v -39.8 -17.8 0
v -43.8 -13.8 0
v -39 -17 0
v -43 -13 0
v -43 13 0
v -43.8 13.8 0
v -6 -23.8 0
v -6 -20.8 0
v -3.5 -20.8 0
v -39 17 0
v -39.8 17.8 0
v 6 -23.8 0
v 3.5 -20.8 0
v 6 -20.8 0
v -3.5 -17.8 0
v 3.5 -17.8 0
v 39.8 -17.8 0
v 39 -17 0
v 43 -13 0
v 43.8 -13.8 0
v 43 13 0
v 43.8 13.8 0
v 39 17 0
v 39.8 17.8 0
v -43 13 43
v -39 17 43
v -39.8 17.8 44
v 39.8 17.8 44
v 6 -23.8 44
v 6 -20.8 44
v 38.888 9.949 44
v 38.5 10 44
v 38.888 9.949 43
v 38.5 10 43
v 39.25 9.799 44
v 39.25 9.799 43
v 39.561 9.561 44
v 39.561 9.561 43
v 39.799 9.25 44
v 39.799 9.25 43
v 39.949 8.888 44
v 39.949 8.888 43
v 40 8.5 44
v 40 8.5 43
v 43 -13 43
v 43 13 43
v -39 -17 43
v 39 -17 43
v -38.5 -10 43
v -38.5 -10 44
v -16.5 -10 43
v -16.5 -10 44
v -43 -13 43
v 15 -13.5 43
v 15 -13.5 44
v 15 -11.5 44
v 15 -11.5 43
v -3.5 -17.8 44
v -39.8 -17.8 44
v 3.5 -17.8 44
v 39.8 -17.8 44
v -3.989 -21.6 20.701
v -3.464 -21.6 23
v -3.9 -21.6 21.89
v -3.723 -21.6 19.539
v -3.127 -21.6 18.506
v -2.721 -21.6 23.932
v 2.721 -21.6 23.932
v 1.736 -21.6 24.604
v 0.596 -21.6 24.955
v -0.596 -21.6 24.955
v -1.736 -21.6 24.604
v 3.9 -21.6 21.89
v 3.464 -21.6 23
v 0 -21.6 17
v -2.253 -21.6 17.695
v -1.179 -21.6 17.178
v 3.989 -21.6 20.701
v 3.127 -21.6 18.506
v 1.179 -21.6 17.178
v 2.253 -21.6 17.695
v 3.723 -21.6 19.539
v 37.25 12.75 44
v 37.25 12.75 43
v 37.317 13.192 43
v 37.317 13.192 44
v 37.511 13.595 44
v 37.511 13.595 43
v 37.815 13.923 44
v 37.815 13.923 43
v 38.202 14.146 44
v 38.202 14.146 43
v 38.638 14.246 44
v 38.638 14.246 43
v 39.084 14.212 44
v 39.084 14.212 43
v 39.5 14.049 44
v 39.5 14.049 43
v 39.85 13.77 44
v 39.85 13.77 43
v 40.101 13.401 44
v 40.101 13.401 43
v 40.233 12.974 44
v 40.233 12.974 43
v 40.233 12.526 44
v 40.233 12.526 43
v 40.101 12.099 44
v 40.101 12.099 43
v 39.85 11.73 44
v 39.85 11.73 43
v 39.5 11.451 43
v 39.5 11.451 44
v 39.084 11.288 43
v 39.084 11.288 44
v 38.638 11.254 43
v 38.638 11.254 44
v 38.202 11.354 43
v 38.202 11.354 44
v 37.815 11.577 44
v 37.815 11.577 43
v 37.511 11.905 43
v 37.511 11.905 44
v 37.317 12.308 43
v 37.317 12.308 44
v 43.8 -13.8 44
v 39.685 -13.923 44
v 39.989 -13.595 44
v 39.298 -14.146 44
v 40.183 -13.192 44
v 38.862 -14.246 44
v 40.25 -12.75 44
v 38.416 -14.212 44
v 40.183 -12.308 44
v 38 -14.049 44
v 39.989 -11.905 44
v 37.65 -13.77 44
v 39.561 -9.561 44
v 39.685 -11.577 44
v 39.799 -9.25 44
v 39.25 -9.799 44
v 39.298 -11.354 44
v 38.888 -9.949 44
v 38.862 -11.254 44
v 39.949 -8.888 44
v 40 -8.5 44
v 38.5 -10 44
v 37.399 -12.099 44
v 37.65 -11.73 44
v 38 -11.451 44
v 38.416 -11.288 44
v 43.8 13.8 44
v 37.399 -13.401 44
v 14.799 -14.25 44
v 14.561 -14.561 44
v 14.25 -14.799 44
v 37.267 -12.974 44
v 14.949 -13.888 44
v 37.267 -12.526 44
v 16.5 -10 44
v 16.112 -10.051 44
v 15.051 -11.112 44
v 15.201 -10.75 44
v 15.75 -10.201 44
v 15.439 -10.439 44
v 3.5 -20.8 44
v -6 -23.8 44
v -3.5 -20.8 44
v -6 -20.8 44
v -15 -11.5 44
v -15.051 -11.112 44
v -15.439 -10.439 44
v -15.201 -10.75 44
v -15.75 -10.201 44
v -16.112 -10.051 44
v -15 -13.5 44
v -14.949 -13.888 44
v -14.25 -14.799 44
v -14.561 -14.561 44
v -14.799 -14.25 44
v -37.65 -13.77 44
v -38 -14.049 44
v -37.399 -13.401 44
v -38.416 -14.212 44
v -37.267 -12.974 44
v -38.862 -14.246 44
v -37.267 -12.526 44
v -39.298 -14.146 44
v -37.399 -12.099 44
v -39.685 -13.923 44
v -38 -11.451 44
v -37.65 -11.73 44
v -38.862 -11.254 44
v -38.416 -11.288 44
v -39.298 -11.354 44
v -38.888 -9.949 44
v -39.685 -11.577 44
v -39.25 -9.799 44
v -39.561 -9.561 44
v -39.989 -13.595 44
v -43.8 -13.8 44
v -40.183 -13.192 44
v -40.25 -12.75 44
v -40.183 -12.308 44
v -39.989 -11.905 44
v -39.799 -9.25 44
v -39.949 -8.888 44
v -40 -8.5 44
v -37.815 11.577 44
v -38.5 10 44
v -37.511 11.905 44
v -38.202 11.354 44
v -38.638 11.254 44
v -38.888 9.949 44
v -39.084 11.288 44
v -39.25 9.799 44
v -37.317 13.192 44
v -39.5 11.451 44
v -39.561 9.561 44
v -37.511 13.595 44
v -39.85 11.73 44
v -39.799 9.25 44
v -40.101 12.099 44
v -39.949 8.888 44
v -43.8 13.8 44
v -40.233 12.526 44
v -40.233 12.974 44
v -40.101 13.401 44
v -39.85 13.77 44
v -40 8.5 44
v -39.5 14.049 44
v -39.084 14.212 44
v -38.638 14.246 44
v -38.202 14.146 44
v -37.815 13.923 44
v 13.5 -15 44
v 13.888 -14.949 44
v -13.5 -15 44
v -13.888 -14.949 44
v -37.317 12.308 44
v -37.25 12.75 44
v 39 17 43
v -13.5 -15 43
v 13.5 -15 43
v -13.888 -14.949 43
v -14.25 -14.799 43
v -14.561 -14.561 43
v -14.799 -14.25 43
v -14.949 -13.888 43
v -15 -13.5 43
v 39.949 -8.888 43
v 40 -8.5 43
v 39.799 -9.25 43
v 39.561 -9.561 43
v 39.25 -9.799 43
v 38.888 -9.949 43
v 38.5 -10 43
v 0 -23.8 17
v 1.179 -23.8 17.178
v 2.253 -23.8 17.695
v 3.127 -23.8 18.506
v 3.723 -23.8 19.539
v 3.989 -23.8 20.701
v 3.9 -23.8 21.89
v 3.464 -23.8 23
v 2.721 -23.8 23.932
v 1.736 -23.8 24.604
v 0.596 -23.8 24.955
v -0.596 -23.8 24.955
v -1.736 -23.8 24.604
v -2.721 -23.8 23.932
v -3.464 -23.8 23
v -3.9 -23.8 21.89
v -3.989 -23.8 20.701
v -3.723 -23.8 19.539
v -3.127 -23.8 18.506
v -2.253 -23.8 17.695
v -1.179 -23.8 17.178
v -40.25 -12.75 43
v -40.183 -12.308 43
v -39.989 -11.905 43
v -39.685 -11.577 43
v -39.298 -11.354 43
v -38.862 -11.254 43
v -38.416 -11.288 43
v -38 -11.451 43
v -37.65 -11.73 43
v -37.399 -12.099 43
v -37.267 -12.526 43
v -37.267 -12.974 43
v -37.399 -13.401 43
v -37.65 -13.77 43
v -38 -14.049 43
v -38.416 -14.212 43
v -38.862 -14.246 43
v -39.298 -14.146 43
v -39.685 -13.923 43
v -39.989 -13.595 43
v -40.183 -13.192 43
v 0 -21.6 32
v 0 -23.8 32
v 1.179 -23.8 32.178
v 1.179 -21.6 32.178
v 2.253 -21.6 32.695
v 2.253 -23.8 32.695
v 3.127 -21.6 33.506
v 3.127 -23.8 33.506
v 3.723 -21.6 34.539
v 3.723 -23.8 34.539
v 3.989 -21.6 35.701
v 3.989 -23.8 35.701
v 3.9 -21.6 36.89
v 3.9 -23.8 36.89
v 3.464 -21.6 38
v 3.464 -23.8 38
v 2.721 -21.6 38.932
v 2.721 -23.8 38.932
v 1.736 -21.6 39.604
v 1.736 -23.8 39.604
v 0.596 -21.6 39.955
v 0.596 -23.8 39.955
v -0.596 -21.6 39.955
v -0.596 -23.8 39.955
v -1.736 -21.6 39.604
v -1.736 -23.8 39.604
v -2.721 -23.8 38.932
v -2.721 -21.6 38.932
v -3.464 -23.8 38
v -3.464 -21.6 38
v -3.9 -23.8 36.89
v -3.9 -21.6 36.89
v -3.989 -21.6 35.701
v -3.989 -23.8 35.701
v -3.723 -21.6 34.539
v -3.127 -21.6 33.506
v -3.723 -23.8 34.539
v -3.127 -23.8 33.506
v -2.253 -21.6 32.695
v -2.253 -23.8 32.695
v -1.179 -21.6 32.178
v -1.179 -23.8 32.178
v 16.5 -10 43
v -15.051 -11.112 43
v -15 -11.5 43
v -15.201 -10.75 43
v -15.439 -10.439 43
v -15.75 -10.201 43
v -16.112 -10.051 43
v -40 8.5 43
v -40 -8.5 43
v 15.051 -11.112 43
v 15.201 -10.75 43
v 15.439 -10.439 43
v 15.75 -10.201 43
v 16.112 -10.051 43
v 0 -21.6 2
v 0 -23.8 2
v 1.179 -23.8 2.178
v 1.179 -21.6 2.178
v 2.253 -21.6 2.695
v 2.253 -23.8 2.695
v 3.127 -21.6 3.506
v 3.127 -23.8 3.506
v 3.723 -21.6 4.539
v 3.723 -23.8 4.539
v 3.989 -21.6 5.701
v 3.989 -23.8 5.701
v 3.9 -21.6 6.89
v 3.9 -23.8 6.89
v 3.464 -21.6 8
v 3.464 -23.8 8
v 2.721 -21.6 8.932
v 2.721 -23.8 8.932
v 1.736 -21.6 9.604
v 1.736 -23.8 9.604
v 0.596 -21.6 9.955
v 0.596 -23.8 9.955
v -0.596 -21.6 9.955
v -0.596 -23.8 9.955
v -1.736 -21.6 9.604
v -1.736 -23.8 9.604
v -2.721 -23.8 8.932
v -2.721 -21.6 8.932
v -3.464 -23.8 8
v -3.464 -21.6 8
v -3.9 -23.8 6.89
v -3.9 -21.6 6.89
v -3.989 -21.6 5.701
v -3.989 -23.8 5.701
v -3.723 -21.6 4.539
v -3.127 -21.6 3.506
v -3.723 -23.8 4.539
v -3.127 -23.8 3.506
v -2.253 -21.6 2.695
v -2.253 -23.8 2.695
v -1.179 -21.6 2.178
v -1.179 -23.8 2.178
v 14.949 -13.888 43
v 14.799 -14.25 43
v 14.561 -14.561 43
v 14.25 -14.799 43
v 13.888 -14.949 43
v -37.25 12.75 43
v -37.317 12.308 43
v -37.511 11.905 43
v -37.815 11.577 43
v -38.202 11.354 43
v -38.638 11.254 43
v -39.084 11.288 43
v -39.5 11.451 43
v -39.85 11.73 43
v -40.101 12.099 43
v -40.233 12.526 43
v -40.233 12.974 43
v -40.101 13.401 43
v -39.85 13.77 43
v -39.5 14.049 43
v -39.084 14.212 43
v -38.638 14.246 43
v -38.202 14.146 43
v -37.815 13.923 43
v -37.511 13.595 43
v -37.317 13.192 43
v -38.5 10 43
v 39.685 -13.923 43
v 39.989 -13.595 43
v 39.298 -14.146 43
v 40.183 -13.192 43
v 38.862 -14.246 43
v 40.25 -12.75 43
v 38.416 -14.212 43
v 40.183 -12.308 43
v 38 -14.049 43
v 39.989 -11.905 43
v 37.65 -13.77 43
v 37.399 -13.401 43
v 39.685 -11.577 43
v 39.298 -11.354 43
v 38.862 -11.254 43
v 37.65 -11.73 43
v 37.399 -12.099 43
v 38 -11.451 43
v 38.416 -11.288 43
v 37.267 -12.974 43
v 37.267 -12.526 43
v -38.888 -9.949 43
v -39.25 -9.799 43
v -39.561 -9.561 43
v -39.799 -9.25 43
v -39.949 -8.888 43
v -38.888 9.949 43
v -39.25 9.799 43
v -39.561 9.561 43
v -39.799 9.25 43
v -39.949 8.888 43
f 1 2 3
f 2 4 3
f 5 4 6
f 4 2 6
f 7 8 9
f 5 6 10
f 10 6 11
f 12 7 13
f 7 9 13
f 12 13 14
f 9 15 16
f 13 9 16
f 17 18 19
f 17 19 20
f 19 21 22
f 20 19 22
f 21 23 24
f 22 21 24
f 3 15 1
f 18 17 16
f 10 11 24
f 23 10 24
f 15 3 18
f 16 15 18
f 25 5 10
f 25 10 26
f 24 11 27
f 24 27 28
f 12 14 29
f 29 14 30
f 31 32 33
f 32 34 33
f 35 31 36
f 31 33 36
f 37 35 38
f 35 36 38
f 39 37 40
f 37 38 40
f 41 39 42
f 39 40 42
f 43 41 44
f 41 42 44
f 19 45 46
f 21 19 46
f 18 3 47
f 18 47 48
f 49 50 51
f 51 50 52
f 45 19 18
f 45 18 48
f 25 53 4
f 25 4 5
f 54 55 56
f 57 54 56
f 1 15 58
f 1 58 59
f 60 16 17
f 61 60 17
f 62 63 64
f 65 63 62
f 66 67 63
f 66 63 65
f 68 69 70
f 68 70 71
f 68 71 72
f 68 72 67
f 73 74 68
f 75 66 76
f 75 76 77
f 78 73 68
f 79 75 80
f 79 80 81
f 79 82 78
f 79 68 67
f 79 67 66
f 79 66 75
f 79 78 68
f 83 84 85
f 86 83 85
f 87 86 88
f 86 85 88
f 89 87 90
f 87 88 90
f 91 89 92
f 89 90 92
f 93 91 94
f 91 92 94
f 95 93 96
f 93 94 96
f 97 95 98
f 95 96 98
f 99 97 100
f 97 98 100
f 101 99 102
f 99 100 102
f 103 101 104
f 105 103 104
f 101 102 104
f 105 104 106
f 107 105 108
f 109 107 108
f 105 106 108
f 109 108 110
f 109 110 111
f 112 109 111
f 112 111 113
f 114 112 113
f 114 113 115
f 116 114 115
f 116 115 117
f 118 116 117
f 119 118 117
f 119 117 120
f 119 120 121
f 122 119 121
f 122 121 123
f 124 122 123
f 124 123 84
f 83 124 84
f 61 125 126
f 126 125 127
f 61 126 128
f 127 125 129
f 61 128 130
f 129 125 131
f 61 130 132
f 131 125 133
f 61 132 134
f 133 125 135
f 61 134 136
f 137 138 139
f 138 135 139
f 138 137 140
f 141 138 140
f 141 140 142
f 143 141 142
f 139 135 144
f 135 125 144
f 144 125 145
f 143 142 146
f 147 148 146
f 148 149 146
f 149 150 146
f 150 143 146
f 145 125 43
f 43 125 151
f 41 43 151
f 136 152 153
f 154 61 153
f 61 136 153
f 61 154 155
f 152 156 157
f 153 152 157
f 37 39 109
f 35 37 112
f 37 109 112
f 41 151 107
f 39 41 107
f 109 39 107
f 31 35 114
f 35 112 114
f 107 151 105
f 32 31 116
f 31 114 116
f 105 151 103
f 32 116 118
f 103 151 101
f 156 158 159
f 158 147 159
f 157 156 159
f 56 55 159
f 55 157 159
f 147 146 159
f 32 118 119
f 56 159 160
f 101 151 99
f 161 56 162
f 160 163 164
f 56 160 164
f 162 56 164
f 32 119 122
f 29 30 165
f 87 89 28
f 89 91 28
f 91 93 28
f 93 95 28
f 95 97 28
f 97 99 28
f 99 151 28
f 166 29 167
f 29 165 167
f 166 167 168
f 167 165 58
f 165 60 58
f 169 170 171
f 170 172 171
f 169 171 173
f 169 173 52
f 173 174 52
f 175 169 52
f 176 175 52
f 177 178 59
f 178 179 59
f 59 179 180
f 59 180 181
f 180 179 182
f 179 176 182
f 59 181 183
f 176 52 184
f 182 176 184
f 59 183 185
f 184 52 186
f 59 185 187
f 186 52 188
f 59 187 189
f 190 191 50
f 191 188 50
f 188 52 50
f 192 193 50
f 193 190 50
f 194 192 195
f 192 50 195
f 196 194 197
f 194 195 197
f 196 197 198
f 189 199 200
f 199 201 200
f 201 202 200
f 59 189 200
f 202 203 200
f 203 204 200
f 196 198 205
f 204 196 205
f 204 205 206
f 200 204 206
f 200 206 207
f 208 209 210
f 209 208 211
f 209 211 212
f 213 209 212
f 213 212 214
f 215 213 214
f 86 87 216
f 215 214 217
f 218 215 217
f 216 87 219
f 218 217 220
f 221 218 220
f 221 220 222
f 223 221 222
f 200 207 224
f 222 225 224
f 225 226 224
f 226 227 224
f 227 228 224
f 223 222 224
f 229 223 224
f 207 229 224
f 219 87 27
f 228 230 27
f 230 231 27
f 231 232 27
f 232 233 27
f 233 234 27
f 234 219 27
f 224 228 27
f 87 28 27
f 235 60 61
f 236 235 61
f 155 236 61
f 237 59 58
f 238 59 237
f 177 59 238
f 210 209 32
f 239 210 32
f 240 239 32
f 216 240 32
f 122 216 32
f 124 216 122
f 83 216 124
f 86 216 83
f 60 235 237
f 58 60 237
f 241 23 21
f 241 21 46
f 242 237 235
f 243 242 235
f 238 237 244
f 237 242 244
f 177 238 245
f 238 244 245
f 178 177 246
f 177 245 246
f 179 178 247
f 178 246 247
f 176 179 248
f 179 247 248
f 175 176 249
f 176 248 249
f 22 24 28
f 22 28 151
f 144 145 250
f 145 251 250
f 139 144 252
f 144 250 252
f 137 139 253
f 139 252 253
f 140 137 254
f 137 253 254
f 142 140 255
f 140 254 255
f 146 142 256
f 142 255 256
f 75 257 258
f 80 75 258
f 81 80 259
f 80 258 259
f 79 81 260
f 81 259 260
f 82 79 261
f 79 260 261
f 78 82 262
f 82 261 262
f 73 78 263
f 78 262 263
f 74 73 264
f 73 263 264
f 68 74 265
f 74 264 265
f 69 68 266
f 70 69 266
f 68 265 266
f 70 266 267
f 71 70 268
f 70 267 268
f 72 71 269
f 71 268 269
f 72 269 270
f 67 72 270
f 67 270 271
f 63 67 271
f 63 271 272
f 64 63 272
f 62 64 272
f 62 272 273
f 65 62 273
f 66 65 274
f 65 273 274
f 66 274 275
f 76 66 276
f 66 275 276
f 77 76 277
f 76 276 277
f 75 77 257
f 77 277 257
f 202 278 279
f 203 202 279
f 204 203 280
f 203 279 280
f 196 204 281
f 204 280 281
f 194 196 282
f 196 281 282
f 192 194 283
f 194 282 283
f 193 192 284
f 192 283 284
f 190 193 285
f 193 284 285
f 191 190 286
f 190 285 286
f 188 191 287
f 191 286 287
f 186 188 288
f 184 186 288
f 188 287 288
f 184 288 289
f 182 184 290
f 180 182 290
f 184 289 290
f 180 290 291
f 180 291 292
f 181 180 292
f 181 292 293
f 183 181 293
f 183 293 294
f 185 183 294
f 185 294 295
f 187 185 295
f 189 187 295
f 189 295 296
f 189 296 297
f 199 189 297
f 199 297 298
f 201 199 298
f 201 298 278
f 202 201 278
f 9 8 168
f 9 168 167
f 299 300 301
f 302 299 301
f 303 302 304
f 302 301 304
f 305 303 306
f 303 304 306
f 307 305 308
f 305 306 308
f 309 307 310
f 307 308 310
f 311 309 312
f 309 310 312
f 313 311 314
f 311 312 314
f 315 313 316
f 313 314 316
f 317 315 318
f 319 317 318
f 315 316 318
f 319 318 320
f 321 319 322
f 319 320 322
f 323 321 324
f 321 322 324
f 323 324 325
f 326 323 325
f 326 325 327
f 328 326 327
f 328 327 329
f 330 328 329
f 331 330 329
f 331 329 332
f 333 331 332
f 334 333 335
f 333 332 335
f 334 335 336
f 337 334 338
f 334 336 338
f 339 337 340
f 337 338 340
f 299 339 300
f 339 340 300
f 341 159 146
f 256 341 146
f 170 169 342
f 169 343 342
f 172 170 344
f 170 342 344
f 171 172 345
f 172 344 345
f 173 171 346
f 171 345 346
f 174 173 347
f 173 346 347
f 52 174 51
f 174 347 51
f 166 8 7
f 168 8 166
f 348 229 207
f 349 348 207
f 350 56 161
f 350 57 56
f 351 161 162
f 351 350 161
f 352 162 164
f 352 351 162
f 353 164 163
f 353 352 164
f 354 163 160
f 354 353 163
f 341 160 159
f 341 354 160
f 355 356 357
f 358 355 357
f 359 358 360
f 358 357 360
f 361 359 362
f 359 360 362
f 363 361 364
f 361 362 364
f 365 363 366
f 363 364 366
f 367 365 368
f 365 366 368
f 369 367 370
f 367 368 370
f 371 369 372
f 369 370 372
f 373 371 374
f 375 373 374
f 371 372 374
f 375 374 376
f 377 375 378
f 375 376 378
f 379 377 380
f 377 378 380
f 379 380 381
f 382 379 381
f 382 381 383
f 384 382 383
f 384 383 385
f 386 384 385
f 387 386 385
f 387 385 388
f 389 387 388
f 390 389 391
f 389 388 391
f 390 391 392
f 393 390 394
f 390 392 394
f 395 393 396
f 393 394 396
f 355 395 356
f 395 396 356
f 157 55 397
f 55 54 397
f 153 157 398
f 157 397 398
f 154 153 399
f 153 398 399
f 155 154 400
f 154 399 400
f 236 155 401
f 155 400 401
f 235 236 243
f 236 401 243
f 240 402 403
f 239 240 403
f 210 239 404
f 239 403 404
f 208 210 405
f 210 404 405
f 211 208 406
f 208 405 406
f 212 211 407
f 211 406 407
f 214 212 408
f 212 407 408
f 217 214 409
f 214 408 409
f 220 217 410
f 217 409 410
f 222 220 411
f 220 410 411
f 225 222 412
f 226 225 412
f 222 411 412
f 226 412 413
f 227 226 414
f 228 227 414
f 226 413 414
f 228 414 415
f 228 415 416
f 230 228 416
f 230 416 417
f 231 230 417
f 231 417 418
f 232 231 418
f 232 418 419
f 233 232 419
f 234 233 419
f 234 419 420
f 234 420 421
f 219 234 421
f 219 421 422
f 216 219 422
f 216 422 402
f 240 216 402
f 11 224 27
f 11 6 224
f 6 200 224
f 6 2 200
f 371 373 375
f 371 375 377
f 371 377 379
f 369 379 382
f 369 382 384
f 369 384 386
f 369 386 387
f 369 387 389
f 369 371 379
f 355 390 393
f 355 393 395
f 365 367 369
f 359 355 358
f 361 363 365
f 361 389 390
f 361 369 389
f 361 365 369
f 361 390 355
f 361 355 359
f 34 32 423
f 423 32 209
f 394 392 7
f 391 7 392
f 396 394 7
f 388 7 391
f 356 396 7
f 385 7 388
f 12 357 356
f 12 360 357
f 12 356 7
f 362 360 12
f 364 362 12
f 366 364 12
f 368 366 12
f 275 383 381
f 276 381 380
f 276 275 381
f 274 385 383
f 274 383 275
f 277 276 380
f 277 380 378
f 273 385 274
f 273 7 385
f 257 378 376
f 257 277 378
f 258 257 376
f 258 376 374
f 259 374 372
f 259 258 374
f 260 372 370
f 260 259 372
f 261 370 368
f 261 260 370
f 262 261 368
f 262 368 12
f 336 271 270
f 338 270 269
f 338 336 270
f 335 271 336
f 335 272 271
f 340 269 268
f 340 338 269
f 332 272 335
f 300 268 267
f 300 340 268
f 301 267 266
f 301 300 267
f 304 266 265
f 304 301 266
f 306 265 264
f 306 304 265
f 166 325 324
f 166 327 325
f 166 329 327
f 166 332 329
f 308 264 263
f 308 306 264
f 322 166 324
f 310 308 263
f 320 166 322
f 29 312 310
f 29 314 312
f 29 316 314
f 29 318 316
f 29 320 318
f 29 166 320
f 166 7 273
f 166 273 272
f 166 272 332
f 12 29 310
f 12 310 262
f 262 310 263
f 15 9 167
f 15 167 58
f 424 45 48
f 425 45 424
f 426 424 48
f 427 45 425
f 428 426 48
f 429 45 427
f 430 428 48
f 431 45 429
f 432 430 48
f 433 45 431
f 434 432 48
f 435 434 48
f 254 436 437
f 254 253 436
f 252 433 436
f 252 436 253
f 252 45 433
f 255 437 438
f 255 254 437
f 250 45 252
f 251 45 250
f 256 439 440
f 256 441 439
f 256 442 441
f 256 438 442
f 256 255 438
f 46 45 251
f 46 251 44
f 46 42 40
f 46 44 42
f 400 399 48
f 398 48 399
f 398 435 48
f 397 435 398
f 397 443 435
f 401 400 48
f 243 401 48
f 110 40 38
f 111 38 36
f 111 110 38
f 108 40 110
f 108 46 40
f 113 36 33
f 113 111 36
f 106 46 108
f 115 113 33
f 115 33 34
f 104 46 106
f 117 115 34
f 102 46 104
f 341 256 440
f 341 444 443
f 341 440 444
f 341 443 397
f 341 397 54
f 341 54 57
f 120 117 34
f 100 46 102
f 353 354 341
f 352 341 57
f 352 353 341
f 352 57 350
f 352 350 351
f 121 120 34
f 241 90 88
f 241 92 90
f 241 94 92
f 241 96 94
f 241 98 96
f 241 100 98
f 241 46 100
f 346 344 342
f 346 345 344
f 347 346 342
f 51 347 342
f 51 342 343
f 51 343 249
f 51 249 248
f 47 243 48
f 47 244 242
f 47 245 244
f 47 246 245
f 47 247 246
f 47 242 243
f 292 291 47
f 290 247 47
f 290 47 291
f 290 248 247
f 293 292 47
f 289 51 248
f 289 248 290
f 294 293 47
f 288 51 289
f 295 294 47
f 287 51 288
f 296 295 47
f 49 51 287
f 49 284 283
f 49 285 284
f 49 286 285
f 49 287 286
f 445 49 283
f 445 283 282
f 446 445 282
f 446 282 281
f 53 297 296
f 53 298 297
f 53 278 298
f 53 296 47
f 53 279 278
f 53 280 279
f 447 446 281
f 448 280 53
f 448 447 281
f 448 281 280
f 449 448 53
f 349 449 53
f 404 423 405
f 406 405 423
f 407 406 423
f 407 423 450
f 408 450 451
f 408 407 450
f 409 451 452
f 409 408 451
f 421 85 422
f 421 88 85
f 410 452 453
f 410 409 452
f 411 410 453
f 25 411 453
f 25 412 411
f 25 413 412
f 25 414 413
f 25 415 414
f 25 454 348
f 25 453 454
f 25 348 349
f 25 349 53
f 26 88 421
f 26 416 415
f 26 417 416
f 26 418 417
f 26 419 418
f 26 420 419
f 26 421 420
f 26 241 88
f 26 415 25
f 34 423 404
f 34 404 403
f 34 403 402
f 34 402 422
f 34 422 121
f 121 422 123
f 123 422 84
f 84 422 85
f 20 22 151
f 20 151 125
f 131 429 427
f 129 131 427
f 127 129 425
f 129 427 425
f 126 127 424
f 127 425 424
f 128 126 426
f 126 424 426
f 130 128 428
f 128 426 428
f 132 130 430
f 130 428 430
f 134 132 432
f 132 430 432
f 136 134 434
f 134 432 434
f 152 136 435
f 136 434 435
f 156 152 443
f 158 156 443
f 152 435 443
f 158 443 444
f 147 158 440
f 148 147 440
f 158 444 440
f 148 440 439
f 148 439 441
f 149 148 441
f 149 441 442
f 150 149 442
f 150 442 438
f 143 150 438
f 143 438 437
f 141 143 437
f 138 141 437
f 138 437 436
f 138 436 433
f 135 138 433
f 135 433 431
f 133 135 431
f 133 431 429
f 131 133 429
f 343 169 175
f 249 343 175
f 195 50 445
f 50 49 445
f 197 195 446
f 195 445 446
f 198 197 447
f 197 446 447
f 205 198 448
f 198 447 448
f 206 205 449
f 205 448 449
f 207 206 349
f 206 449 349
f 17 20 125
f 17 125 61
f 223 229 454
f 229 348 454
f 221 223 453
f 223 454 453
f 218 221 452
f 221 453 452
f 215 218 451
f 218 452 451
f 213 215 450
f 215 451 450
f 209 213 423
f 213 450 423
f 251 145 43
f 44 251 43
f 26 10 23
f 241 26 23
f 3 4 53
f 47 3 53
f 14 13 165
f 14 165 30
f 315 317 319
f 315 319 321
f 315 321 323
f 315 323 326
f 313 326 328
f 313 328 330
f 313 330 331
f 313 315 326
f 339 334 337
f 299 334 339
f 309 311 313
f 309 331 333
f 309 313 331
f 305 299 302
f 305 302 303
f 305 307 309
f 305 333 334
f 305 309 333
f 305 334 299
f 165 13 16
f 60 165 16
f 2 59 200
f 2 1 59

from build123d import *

# Parameters (mm, degrees)
SKETCH_1_W          = 87.6
SKETCH_1_H          = 35.6
SKETCH_1_W_2        = 86
SKETCH_1_H_2        = 34
EXTRUDE_1_DEPTH     = 43
CHAMFER_1_SIZE      = 4
EXTRUDE_2_DEPTH     = 1
CUT_EXTRUDE_1_DEPTH = 65.585447277
FILLET_1_R          = 1.5
SKETCH_4_R          = 1.5
CUT_EXTRUDE_2_DEPTH = 64.908371909
SKETCH_5_W          = 12
SKETCH_5_H          = 44
EXTRUDE_3_DEPTH     = 6
SKETCH_6_W          = 2.5
SKETCH_6_H          = 3
CUT_EXTRUDE_3_DEPTH = 67.48969845
SKETCH_7_R          = 4
CUT_EXTRUDE_4_DEPTH = 2.2


with BuildPart() as part:
    # 草圖1 → 填料-伸長1 (new body)
    with BuildSketch(Plane.XY):
        Rectangle(SKETCH_1_W, SKETCH_1_H)
        Rectangle(SKETCH_1_W_2, SKETCH_1_H_2, mode=Mode.SUBTRACT)
    extrude(amount=EXTRUDE_1_DEPTH)

    # 導角1
    chamfer_1_edges = [part.edges().sort_by_distance(p)[0] for p in [
        (-43, 17, 21.5),
        (-43, -17, 21.5),
        (43, -17, 21.5),
        (43, 17, 21.5),
        (-43.8, 17.8, 21.5),
        (43.8, 17.8, 21.5),
        (43.8, -17.8, 21.5),
        (-43.8, -17.8, 21.5),
    ]]
    chamfer(chamfer_1_edges, length=CHAMFER_1_SIZE)

    # 草圖2 → 填料-伸長2 (add)
    with BuildSketch(Plane.XY.offset(43)):
        Polygon((-43.8, 13.8), (-39.8, 17.8), (39.8, 17.8), (43.8, 13.8), (43.8, -13.8), (39.8, -17.8), (-39.8, -17.8), (-43.8, -13.8), align=None)
    extrude(amount=EXTRUDE_2_DEPTH)

    # 草圖3 → 除料-伸長1 (cut, through all)
    with BuildSketch(Plane.XY.offset(44)):
        Polygon((15, -10), (40, -10), (40, 10), (-40, 10), (-40, -10), (-15, -10), (-15, -15), (15, -15), align=None)
    extrude(amount=-CUT_EXTRUDE_1_DEPTH, mode=Mode.SUBTRACT)

    # 圓角1
    fillet_1_edges = [part.edges().sort_by_distance(p)[0] for p in [
        (-40, -10, 43.5),
        (-40, 10, 43.5),
        (40, 10, 43.5),
        (40, -10, 43.5),
        (15, -10, 43.5),
        (15, -15, 43.5),
        (-15, -15, 43.5),
        (-15, -10, 43.5),
    ]]
    fillet(fillet_1_edges, radius=FILLET_1_R)

    # 草圖4 → 除料-伸長2 (cut, through all)
    with BuildSketch(Plane(origin=(0, 0, 43), x_dir=(-1, 0, 0), z_dir=(0, 0, -1))):
        with Locations((-38.75, 12.75)):
            Circle(SKETCH_4_R)
        with Locations(Location((38.75, 12.75, 0), (0, 0, 180))):
            Circle(SKETCH_4_R)
        with Locations((38.75, -12.75)):
            Circle(SKETCH_4_R)
        with Locations(Location((-38.75, -12.75, 0), (0, 0, 180))):
            Circle(SKETCH_4_R)
    extrude(amount=-CUT_EXTRUDE_2_DEPTH, mode=Mode.SUBTRACT)

    # 草圖5 → 填料-伸長3 (add)
    with BuildSketch(Plane.XZ.offset(17.8)):
        with Locations((0, 22)):
            Rectangle(SKETCH_5_W, SKETCH_5_H)
    extrude(amount=EXTRUDE_3_DEPTH)

    # 草圖6 → 除料-伸長3 (cut, through all)
    with BuildSketch(Plane.XY.offset(44)):
        with Locations((4.75, -19.3)):
            Rectangle(SKETCH_6_W, SKETCH_6_H)
        with Locations((-4.75, -19.3)):
            Rectangle(SKETCH_6_W, SKETCH_6_H)
    extrude(amount=-CUT_EXTRUDE_3_DEPTH, mode=Mode.SUBTRACT)

    # 草圖7 → 除料-伸長4 (cut)
    with BuildSketch(Plane.XZ.offset(23.8)):
        with Locations(Location((0, 6, 0), (0, 0, 270))):
            Circle(SKETCH_7_R)
        with Locations(Location((0, 21, 0), (0, 0, 270))):
            Circle(SKETCH_7_R)
        with Locations(Location((0, 36, 0), (0, 0, 270))):
            Circle(SKETCH_7_R)
    extrude(amount=-CUT_EXTRUDE_4_DEPTH, mode=Mode.SUBTRACT)


solid = part.part
